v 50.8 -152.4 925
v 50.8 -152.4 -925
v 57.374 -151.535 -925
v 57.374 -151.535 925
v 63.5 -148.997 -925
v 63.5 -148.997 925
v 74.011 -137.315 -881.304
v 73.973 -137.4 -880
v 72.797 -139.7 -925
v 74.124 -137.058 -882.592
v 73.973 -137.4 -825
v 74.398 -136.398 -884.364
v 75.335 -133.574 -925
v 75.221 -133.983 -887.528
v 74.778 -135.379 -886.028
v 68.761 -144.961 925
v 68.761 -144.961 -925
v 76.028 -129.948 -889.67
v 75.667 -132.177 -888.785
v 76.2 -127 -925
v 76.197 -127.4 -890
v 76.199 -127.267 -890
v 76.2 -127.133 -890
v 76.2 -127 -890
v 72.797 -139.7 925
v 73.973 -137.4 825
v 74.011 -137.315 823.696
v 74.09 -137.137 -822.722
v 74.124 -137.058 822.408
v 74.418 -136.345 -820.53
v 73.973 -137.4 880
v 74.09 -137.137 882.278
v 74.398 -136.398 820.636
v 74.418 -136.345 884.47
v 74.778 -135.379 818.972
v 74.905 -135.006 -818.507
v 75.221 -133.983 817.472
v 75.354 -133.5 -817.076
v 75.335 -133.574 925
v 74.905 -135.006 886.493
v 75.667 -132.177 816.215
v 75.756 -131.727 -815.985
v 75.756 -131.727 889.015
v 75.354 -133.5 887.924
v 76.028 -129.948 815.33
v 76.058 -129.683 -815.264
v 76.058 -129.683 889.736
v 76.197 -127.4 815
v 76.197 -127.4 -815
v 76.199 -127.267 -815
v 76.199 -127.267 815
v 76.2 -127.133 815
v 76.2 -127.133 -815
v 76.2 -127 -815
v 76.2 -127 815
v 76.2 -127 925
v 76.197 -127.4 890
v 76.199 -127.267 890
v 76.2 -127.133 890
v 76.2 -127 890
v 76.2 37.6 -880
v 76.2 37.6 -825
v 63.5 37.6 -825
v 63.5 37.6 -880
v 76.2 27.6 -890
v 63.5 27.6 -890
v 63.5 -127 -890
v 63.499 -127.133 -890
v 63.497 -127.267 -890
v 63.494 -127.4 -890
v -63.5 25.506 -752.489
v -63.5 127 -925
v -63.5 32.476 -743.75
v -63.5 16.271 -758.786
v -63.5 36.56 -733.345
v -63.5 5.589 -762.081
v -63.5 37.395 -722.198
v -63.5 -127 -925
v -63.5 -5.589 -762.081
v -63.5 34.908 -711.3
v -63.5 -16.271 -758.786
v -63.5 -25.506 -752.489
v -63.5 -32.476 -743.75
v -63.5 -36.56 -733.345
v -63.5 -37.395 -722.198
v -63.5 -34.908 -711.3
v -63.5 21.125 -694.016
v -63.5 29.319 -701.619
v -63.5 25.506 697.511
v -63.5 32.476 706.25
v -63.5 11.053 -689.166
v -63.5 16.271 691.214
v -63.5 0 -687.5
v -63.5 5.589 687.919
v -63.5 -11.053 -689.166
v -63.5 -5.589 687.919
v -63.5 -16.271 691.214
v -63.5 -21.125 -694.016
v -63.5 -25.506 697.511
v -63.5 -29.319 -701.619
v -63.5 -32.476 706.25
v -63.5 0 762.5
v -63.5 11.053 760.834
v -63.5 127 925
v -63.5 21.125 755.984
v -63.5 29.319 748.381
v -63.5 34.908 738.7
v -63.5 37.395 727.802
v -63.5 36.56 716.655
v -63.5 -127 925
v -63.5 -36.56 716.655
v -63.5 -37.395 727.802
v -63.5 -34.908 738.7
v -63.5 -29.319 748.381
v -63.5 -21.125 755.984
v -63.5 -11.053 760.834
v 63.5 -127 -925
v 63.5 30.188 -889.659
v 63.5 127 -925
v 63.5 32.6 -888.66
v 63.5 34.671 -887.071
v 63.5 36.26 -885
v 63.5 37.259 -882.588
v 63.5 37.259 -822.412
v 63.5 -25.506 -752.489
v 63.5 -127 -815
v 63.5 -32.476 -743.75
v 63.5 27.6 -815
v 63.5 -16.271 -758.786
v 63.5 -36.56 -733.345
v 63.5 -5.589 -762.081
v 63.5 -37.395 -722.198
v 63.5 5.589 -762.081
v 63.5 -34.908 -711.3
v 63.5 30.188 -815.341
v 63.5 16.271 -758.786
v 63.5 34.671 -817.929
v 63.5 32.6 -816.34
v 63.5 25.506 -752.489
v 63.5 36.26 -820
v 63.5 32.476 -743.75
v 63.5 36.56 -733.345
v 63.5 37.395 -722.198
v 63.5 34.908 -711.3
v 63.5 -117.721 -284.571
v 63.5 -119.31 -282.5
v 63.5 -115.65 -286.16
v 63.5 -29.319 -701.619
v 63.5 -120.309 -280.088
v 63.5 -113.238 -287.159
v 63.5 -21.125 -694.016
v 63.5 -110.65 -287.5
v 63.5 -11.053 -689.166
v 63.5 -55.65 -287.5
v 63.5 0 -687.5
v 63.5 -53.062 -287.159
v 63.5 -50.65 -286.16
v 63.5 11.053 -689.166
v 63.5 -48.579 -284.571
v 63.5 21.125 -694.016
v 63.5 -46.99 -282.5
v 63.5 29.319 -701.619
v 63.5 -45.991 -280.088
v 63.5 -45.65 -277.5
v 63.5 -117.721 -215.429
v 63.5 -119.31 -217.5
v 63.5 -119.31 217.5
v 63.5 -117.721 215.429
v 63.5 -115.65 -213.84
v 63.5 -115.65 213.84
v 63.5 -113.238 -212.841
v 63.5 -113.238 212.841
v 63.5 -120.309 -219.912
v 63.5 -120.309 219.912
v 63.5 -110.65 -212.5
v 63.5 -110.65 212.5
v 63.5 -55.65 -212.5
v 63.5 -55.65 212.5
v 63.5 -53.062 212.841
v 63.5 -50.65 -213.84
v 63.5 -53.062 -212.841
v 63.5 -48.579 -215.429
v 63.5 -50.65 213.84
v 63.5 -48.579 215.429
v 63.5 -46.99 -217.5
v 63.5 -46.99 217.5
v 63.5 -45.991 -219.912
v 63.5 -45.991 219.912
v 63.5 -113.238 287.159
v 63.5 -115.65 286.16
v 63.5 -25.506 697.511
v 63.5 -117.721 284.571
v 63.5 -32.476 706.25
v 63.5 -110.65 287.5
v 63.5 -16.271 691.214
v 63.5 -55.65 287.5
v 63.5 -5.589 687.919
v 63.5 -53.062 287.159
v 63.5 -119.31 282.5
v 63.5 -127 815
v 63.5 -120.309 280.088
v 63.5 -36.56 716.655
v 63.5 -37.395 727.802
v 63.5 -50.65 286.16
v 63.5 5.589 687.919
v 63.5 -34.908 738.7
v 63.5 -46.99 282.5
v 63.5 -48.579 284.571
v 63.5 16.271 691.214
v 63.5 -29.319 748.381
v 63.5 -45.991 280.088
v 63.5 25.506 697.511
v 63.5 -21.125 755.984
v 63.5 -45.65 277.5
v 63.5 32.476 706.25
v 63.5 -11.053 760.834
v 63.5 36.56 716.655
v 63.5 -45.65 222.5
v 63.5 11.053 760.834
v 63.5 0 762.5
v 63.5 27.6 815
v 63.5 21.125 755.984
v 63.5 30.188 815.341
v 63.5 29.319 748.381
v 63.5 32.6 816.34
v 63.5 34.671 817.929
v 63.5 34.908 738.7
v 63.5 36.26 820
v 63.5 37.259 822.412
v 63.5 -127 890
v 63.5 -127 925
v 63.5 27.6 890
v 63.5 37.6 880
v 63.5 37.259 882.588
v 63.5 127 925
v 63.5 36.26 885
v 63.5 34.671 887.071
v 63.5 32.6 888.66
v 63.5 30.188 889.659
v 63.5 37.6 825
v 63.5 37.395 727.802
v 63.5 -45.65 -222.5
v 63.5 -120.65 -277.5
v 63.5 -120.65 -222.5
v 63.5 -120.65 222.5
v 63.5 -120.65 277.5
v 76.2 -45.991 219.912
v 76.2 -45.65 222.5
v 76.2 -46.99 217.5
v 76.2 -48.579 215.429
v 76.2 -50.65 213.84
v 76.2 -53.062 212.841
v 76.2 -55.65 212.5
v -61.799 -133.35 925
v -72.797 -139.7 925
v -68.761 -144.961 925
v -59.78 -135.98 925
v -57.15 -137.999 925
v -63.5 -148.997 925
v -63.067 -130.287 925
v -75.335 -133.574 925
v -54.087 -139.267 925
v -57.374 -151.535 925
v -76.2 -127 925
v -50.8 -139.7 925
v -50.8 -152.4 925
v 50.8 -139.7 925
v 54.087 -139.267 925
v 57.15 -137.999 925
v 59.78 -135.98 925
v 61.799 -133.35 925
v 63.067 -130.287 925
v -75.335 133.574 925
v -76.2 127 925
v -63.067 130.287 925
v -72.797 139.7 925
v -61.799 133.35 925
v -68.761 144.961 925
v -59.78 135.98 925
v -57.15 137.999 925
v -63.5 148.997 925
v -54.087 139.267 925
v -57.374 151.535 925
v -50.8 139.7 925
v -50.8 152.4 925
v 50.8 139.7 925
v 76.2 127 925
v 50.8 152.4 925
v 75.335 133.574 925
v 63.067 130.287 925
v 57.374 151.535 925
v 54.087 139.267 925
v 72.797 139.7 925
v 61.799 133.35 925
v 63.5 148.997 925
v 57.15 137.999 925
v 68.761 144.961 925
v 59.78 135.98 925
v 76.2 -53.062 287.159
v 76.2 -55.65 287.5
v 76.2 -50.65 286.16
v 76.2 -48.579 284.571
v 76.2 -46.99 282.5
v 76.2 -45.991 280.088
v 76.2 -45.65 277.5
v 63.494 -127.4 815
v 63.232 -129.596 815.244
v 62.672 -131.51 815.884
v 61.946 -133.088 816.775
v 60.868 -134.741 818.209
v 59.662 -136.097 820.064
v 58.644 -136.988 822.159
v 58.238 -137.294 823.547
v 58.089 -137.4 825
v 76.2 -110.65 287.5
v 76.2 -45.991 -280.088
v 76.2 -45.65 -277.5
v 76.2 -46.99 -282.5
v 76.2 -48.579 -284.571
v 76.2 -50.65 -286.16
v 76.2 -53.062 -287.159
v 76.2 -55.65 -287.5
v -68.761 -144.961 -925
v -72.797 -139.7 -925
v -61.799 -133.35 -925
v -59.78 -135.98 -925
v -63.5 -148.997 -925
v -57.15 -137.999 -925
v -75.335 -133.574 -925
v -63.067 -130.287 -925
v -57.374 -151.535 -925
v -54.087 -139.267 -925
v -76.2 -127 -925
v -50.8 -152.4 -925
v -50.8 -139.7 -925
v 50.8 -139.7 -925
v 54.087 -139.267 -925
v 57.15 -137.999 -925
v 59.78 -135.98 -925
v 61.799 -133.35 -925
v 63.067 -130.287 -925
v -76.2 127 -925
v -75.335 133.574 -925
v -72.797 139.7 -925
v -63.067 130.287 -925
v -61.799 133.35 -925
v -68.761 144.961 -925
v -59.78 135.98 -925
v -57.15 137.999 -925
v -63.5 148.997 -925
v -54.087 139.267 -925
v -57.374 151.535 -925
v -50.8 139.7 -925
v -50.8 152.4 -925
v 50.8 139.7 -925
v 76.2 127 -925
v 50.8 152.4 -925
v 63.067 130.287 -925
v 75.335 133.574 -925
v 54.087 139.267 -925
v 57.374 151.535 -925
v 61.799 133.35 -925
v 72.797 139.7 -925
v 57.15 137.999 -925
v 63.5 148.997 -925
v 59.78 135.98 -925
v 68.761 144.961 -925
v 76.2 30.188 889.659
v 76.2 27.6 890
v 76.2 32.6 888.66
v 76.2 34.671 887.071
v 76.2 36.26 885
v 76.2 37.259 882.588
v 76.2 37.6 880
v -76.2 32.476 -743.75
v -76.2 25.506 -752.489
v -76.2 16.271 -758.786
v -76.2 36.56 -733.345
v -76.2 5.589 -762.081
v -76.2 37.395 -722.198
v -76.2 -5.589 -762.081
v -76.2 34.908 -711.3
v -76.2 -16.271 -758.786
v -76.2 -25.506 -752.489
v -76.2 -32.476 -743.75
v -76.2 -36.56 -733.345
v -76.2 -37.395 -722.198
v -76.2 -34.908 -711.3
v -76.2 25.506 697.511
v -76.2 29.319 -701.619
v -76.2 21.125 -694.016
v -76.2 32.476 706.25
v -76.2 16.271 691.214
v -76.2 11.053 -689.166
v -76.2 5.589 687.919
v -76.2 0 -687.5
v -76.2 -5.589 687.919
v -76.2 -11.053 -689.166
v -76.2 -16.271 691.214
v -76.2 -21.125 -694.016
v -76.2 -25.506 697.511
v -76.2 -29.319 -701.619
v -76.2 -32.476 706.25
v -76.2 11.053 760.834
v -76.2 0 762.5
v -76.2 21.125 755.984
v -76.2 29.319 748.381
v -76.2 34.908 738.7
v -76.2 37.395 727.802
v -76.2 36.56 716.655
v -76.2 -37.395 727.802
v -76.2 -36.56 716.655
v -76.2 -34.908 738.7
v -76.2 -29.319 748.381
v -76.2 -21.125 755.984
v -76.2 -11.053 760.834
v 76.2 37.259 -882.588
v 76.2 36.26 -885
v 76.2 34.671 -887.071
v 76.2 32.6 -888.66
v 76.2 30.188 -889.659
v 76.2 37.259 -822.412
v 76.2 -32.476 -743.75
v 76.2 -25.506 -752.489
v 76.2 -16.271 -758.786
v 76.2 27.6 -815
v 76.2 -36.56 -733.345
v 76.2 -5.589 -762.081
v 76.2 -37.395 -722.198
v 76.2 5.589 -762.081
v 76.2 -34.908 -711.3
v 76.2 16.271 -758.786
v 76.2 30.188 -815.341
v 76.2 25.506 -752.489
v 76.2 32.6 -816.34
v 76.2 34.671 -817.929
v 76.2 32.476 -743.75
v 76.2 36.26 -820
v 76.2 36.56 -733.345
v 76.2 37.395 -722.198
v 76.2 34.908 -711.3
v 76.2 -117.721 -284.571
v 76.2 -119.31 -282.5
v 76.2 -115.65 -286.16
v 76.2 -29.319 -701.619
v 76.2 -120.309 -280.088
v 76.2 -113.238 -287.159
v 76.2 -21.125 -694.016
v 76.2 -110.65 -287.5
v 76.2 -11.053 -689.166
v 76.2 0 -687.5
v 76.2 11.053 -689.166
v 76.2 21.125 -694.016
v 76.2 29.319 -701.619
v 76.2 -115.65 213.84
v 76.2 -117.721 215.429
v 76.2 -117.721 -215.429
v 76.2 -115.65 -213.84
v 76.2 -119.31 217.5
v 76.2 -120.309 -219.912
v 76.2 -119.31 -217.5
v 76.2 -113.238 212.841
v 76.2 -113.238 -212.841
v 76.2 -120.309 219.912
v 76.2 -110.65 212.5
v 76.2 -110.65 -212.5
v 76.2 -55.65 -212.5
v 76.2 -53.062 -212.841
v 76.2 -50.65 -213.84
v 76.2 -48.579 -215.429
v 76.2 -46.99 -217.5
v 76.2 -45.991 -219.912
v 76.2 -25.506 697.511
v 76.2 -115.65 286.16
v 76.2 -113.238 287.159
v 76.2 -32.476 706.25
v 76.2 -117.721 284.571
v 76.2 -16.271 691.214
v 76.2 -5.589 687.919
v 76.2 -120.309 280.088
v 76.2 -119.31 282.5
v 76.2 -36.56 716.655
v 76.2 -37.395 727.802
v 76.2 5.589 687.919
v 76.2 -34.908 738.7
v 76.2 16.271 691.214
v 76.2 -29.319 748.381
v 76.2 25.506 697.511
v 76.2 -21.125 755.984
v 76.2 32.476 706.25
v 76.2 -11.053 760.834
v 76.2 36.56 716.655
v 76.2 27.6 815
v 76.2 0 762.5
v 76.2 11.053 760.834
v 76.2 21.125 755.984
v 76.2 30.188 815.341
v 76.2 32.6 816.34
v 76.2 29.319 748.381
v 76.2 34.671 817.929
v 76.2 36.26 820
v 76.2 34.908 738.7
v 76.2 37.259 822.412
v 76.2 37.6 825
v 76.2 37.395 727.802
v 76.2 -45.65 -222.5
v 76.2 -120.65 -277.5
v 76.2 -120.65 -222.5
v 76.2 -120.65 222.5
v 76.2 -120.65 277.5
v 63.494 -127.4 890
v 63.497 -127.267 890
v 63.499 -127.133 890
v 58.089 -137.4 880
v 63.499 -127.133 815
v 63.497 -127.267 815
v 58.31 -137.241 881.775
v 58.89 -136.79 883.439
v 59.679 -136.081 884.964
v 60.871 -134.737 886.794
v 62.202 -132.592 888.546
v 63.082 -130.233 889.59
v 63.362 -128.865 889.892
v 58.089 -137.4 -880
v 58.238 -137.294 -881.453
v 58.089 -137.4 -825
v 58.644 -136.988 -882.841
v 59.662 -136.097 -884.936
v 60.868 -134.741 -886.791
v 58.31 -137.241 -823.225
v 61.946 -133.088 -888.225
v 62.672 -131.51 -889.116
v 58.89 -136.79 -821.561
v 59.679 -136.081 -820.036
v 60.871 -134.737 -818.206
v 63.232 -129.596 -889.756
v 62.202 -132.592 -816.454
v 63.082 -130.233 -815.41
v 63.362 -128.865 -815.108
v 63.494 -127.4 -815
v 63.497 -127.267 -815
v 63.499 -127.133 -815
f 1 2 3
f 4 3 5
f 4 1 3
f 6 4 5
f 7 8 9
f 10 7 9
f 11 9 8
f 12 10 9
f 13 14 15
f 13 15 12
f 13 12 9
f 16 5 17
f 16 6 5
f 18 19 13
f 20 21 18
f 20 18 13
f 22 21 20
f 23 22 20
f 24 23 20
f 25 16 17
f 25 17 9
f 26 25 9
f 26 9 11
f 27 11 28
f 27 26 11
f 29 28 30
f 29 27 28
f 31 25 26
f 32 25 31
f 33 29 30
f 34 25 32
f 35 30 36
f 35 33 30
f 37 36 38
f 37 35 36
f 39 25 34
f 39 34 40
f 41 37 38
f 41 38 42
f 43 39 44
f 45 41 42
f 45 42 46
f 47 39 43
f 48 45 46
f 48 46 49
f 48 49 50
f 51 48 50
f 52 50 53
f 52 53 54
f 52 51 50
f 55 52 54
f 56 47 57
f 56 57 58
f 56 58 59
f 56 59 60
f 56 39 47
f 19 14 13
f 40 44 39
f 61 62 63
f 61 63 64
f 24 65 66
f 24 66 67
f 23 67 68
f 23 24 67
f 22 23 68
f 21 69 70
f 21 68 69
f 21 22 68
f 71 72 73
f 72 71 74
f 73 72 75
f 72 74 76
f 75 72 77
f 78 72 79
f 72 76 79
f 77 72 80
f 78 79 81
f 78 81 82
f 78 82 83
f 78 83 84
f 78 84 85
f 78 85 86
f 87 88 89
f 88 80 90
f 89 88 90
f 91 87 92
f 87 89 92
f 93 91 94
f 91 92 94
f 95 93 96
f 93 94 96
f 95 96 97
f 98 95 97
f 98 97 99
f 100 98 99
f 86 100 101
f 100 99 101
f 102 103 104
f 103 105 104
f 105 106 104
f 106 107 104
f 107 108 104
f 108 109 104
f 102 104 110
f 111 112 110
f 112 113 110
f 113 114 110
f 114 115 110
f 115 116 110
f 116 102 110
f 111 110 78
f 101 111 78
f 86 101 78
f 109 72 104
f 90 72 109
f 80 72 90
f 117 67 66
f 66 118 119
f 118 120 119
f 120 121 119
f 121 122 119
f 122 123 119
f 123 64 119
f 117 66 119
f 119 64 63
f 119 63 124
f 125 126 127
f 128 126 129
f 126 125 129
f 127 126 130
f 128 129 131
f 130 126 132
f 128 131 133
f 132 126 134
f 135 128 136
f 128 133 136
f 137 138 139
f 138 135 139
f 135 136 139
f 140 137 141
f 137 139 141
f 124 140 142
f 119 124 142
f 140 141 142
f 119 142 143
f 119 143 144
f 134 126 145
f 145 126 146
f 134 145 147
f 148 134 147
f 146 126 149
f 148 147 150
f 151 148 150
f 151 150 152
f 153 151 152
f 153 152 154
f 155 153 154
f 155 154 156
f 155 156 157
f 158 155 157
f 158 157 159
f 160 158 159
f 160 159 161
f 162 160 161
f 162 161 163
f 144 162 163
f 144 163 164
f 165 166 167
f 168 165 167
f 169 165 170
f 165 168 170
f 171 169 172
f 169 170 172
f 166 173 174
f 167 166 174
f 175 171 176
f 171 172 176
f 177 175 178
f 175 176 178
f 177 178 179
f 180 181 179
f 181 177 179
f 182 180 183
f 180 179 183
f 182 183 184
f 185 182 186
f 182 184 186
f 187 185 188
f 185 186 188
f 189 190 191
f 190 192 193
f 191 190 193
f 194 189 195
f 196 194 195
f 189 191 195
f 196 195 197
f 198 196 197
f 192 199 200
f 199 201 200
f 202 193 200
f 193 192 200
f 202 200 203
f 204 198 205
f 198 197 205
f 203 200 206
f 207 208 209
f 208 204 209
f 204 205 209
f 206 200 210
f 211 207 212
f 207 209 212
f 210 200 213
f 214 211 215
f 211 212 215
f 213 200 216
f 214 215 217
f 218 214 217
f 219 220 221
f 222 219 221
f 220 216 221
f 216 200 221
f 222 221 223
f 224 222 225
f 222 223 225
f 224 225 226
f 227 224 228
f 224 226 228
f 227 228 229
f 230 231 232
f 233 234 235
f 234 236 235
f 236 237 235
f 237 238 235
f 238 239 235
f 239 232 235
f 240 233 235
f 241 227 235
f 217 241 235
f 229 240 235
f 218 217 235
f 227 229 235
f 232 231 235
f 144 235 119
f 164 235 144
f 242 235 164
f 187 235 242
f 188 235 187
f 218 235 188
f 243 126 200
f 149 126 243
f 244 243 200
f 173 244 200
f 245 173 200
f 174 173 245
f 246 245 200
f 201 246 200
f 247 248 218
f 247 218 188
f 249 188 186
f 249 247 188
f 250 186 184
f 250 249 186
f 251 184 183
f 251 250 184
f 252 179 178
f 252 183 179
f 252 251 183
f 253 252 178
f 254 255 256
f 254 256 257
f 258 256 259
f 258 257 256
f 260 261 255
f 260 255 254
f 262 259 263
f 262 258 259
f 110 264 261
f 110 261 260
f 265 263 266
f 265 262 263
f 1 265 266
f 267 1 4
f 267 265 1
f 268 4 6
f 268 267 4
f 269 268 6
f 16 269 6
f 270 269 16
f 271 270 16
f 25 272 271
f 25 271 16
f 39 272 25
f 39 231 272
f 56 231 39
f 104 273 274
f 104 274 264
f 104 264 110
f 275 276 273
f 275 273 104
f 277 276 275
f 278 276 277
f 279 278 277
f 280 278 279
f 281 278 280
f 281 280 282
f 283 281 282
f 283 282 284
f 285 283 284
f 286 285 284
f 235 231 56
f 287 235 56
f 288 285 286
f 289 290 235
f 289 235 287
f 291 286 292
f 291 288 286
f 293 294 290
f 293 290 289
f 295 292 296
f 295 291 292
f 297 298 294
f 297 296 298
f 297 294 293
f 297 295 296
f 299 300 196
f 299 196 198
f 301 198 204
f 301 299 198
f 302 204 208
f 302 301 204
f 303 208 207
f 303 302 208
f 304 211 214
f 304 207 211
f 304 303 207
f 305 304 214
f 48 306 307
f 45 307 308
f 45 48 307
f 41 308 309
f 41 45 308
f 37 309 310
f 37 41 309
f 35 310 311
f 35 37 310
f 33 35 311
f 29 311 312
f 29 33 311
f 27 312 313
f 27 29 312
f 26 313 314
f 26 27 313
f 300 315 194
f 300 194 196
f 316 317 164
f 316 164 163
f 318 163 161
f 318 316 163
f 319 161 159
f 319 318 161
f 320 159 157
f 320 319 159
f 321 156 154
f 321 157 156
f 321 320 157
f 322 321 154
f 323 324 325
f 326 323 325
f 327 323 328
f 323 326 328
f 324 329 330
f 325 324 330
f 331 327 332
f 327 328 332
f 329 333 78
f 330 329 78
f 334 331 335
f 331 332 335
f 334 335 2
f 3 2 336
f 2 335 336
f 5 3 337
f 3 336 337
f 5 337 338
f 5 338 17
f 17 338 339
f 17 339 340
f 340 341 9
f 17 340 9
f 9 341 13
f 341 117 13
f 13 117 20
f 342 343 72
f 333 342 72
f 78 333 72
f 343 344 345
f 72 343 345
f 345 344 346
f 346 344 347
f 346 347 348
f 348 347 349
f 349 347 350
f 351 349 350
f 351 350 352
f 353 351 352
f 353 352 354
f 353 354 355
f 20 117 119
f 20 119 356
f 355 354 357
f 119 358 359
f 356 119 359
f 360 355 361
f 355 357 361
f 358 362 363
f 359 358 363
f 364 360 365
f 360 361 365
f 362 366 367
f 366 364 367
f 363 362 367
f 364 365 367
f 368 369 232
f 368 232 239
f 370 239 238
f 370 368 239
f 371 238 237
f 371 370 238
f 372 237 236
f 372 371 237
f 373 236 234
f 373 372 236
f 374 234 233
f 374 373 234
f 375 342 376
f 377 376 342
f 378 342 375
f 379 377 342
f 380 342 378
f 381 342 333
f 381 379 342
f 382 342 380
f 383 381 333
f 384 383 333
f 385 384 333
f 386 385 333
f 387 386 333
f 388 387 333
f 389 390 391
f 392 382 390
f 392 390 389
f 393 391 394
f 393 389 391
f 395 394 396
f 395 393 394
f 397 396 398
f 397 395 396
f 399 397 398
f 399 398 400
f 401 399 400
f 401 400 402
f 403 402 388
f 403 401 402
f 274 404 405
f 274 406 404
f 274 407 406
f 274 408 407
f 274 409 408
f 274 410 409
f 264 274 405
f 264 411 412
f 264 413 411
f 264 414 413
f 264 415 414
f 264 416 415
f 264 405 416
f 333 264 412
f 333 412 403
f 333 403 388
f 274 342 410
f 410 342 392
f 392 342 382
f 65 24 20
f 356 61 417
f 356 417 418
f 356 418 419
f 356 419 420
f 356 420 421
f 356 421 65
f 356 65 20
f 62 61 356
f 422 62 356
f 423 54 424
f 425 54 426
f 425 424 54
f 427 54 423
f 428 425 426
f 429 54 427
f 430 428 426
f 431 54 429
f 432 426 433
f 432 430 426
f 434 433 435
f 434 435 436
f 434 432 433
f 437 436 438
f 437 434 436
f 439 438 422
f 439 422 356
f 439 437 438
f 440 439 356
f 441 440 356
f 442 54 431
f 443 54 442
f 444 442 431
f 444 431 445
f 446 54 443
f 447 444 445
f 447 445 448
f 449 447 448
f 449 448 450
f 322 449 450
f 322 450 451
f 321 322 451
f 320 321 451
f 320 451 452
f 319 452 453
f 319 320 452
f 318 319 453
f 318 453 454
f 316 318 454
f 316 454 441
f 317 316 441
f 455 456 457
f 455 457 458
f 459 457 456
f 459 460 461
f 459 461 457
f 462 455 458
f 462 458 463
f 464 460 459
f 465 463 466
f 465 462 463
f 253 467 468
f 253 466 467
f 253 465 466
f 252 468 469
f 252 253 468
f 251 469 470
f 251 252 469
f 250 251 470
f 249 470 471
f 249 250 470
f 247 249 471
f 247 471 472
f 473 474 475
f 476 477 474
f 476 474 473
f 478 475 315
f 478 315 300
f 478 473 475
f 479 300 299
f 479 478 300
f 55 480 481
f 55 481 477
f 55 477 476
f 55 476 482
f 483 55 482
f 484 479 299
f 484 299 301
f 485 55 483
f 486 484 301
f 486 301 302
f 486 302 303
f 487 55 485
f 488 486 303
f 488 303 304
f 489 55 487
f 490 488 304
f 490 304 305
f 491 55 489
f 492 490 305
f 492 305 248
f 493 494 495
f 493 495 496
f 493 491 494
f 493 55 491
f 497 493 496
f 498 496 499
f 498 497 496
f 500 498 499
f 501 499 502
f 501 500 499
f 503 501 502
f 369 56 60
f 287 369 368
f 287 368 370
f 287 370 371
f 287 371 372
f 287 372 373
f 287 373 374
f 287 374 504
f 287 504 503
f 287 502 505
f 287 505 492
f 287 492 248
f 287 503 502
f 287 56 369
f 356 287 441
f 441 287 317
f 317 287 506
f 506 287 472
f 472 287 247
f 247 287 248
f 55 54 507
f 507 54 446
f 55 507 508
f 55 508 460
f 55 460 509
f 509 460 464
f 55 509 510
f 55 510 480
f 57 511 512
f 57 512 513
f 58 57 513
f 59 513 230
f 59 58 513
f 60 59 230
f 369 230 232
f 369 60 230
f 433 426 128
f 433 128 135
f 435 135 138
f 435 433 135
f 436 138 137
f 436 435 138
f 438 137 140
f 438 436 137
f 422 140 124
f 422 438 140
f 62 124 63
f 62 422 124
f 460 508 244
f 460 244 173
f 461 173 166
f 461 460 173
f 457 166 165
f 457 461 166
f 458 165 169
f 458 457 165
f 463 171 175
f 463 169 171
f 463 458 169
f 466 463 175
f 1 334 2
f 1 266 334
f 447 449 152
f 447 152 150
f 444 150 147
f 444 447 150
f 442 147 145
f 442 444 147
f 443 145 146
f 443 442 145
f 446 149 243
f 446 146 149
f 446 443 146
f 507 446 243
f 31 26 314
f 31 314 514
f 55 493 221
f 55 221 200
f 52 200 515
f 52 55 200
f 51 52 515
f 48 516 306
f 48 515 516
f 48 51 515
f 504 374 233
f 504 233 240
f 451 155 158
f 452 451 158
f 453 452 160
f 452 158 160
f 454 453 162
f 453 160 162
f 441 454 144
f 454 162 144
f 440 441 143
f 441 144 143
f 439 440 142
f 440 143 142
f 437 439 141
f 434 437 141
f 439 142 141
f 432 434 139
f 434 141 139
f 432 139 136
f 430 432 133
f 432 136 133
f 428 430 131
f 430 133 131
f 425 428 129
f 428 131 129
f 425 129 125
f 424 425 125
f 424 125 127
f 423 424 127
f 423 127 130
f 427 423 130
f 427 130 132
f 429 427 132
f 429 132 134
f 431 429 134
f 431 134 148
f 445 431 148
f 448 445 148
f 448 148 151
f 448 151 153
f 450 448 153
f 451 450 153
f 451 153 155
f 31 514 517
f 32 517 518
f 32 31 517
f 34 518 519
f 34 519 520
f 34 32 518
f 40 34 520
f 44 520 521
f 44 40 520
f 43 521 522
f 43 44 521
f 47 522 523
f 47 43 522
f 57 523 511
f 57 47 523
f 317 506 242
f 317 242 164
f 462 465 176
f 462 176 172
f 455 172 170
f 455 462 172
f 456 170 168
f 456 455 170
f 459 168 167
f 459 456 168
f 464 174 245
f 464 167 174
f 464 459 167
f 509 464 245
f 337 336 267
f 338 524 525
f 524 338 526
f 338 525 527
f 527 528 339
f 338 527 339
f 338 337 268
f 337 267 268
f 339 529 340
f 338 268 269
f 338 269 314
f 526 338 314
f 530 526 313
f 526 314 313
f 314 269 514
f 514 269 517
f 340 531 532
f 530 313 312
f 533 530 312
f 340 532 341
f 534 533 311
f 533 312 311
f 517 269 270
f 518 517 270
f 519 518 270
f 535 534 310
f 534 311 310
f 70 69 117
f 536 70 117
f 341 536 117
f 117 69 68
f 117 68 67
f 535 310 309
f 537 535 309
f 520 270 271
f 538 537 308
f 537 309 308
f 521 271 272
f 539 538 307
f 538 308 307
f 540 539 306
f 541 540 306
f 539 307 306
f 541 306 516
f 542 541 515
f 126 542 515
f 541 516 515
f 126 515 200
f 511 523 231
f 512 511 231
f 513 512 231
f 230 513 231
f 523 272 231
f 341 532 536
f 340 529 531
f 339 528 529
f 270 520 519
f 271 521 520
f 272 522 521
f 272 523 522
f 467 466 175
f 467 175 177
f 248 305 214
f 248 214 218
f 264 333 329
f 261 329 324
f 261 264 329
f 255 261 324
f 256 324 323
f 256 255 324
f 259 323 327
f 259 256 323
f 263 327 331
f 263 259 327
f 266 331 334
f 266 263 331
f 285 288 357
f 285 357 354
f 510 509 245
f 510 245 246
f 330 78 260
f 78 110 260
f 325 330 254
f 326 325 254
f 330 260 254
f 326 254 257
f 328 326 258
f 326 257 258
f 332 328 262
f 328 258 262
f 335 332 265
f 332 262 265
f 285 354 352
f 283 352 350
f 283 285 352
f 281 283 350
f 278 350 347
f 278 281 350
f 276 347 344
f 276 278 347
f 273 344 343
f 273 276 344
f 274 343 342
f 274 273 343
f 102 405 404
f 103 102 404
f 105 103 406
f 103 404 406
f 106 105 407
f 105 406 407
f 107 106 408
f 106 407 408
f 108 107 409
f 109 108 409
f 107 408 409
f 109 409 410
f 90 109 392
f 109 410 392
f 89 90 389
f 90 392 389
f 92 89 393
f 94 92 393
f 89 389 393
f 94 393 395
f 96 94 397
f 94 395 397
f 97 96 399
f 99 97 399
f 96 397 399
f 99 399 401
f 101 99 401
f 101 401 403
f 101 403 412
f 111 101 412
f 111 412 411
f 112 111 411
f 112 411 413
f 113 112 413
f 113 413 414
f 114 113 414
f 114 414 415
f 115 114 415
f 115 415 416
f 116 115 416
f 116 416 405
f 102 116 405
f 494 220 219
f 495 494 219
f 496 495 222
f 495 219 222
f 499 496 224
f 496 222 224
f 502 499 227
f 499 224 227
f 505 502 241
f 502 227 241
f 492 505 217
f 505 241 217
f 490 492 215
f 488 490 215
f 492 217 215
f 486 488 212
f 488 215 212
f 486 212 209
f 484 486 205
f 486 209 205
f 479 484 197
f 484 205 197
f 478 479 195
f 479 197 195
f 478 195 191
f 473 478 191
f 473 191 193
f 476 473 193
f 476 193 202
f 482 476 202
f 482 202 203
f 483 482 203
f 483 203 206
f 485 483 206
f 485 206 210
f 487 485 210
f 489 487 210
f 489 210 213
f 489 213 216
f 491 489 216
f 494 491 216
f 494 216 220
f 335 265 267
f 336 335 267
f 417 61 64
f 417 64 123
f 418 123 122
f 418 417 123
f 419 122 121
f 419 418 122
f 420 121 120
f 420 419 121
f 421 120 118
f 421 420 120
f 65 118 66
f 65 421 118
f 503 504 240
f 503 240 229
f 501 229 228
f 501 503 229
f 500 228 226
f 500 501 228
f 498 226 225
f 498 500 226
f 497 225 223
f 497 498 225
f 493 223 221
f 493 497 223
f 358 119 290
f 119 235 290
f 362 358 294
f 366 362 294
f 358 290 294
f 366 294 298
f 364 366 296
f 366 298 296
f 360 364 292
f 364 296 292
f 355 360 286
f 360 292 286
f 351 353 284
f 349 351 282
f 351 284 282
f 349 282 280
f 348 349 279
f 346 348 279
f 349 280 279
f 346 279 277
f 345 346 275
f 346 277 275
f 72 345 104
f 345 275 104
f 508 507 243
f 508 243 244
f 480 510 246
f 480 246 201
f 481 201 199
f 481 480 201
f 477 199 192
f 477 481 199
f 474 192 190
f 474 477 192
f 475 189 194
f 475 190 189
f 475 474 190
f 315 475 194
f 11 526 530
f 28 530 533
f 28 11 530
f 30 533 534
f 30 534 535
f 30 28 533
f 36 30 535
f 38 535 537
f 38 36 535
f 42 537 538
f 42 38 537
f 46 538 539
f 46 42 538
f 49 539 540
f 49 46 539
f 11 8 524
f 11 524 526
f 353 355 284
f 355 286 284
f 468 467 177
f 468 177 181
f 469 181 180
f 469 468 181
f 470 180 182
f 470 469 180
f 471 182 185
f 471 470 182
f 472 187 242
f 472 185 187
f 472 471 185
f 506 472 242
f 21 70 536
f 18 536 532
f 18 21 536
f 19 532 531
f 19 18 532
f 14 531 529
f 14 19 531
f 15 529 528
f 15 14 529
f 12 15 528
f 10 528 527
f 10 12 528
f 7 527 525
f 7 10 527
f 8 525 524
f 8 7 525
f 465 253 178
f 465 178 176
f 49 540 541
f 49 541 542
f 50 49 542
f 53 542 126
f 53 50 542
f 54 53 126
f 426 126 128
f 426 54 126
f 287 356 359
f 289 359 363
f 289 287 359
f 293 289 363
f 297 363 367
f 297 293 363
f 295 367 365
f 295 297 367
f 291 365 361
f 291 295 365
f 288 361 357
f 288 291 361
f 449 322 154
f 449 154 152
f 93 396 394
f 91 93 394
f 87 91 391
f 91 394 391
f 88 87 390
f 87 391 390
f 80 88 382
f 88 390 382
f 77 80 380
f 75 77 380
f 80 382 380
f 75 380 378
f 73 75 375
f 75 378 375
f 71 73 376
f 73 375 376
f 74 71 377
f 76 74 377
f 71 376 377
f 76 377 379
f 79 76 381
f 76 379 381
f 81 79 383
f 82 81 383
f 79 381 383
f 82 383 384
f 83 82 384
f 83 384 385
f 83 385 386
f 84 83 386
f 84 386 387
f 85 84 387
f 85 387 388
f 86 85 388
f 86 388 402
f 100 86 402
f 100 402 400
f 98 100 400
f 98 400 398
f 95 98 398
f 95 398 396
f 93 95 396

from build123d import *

# Parameters (mm, degrees)
BOSS_EXTRUDE1_DEPTH                       = 925
CUT_EXTRUDE1_DEPTH                        = 30
FOR_MACH_SHOP_CONFIRM_W_PROGRAMMING_REACH = 951.777
SKETCH5_R                                 = 37.5
CUT_EXTRUDE3_DEPTH                        = 950.777089767


with BuildPart() as part:
    # Sketch1 → Boss-Extrude1 (new, symmetric)
    with BuildSketch(Plane.XY):
        with BuildLine():
            Line((-50.8, -152.4), (50.8, -152.4))
            ThreePointArc((50.8, -152.4), (68.760512242, -144.960512242), (76.2, -127))
            Line((76.2, -127), (76.2, 127))
            ThreePointArc((76.2, 127), (68.760512242, 144.960512242), (50.8, 152.4))
            Line((50.8, 152.4), (-50.8, 152.4))
            ThreePointArc((-50.8, 152.4), (-68.760512242, 144.960512242), (-76.2, 127))
            Line((-76.2, 127), (-76.2, -127))
            ThreePointArc((-76.2, -127), (-68.760512242, -144.960512242), (-50.8, -152.4))
        make_face()
        with BuildLine():
            Line((-50.8, -139.7), (50.8, -139.7))
            ThreePointArc((50.8, -139.7), (59.780256121, -135.980256121), (63.5, -127))
            Line((63.5, -127), (63.5, 127))
            ThreePointArc((63.5, 127), (59.780256121, 135.980256121), (50.8, 139.7))
            Line((50.8, 139.7), (-50.8, 139.7))
            ThreePointArc((-50.8, 139.7), (-59.780256121, 135.980256121), (-63.5, 127))
            Line((-63.5, 127), (-63.5, -127))
            ThreePointArc((-63.5, -127), (-59.780256121, -135.980256121), (-50.8, -139.7))
        make_face(mode=Mode.SUBTRACT)
    extrude(amount=BOSS_EXTRUDE1_DEPTH, both=True)

    # Sketch2 → Cut-Extrude1 (cut)
    with BuildSketch(Plane(origin=(76.2, 0, 0), x_dir=(0, 0, -1), z_dir=(1, 0, 0))):
        with BuildLine():
            Line((-880, 37.6), (-825, 37.6))
            ThreePointArc((-825, 37.6), (-817.928932188, 34.671067812), (-815, 27.6))
            Line((-815, 27.6), (-815, -127.4))
            ThreePointArc((-815, -127.4), (-817.928932188, -134.471067812), (-825, -137.4))
            Line((-825, -137.4), (-880, -137.4))
            ThreePointArc((-880, -137.4), (-887.071067812, -134.471067812), (-890, -127.4))
            Line((-890, -127.4), (-890, 27.6))
            ThreePointArc((-890, 27.6), (-887.071067812, 34.671067812), (-880, 37.6))
        make_face()
        with BuildLine():
            Line((825, 37.6), (880, 37.6))
            ThreePointArc((880, 37.6), (887.071067812, 34.671067812), (890, 27.6))
            Line((890, 27.6), (890, -127.4))
            ThreePointArc((890, -127.4), (887.071067812, -134.471067812), (880, -137.4))
            Line((880, -137.4), (825, -137.4))
            ThreePointArc((825, -137.4), (817.928932188, -134.471067812), (815, -127.4))
            Line((815, -127.4), (815, 27.6))
            ThreePointArc((815, 27.6), (817.928932188, 34.671067812), (825, 37.6))
        make_face()
    extrude(amount=-CUT_EXTRUDE1_DEPTH, mode=Mode.SUBTRACT)

    # Sketch3 → for mach shop confirm w/ programming (cut, up to next)
    with BuildSketch(Plane(origin=(76.2, 0, 0), x_dir=(0, 0, -1), z_dir=(1, 0, 0)), mode=Mode.PRIVATE) as for_mach_shop_confirm_w_programming_sk1:
        with BuildLine():
            Line((-277.5, -45.65), (-222.5, -45.65))
            ThreePointArc((-222.5, -45.65), (-215.428932188, -48.578932188), (-212.5, -55.65))
            Line((-212.5, -55.65), (-212.5, -110.65))
            ThreePointArc((-212.5, -110.65), (-215.428932188, -117.721067812), (-222.5, -120.65))
            Line((-222.5, -120.65), (-277.5, -120.65))
            ThreePointArc((-277.5, -120.65), (-284.571067812, -117.721067812), (-287.5, -110.65))
            Line((-287.5, -110.65), (-287.5, -55.65))
            ThreePointArc((-287.5, -55.65), (-284.571067812, -48.578932188), (-277.5, -45.65))
        make_face()
    for_mach_shop_confirm_w_programming_tool1 = extrude(for_mach_shop_confirm_w_programming_sk1.sketch, amount=-FOR_MACH_SHOP_CONFIRM_W_PROGRAMMING_REACH, mode=Mode.PRIVATE) & part.part
    # Sketch3 → for mach shop confirm w/ programming (cut, up to next)
    with BuildSketch(Plane(origin=(76.2, 0, 0), x_dir=(0, 0, -1), z_dir=(1, 0, 0)), mode=Mode.PRIVATE) as for_mach_shop_confirm_w_programming_sk2:
        with BuildLine():
            Line((222.5, -45.65), (277.5, -45.65))
            ThreePointArc((277.5, -45.65), (284.571067812, -48.578932188), (287.5, -55.65))
            Line((287.5, -55.65), (287.5, -110.65))
            ThreePointArc((287.5, -110.65), (284.571067812, -117.721067812), (277.5, -120.65))
            Line((277.5, -120.65), (222.5, -120.65))
            ThreePointArc((222.5, -120.65), (215.428932188, -117.721067812), (212.5, -110.65))
            Line((212.5, -110.65), (212.5, -55.65))
            ThreePointArc((212.5, -55.65), (215.428932188, -48.578932188), (222.5, -45.65))
        make_face()
    for_mach_shop_confirm_w_programming_tool2 = extrude(for_mach_shop_confirm_w_programming_sk2.sketch, amount=-FOR_MACH_SHOP_CONFIRM_W_PROGRAMMING_REACH, mode=Mode.PRIVATE) & part.part
    add(for_mach_shop_confirm_w_programming_tool1.solids().sort_by_distance((76.2, -83.15, 250))[0], mode=Mode.SUBTRACT)
    add(for_mach_shop_confirm_w_programming_tool2.solids().sort_by_distance((76.2, -83.15, -250))[0], mode=Mode.SUBTRACT)

    # Sketch5 → Cut-Extrude3 (cut, through all)
    with BuildSketch(Plane.ZY.offset(76.2)):
        with Locations((725, 0)):
            Circle(SKETCH5_R)
        with Locations((-725, 0)):
            Circle(SKETCH5_R)
    extrude(amount=-CUT_EXTRUDE3_DEPTH, mode=Mode.SUBTRACT)


solid = part.part
